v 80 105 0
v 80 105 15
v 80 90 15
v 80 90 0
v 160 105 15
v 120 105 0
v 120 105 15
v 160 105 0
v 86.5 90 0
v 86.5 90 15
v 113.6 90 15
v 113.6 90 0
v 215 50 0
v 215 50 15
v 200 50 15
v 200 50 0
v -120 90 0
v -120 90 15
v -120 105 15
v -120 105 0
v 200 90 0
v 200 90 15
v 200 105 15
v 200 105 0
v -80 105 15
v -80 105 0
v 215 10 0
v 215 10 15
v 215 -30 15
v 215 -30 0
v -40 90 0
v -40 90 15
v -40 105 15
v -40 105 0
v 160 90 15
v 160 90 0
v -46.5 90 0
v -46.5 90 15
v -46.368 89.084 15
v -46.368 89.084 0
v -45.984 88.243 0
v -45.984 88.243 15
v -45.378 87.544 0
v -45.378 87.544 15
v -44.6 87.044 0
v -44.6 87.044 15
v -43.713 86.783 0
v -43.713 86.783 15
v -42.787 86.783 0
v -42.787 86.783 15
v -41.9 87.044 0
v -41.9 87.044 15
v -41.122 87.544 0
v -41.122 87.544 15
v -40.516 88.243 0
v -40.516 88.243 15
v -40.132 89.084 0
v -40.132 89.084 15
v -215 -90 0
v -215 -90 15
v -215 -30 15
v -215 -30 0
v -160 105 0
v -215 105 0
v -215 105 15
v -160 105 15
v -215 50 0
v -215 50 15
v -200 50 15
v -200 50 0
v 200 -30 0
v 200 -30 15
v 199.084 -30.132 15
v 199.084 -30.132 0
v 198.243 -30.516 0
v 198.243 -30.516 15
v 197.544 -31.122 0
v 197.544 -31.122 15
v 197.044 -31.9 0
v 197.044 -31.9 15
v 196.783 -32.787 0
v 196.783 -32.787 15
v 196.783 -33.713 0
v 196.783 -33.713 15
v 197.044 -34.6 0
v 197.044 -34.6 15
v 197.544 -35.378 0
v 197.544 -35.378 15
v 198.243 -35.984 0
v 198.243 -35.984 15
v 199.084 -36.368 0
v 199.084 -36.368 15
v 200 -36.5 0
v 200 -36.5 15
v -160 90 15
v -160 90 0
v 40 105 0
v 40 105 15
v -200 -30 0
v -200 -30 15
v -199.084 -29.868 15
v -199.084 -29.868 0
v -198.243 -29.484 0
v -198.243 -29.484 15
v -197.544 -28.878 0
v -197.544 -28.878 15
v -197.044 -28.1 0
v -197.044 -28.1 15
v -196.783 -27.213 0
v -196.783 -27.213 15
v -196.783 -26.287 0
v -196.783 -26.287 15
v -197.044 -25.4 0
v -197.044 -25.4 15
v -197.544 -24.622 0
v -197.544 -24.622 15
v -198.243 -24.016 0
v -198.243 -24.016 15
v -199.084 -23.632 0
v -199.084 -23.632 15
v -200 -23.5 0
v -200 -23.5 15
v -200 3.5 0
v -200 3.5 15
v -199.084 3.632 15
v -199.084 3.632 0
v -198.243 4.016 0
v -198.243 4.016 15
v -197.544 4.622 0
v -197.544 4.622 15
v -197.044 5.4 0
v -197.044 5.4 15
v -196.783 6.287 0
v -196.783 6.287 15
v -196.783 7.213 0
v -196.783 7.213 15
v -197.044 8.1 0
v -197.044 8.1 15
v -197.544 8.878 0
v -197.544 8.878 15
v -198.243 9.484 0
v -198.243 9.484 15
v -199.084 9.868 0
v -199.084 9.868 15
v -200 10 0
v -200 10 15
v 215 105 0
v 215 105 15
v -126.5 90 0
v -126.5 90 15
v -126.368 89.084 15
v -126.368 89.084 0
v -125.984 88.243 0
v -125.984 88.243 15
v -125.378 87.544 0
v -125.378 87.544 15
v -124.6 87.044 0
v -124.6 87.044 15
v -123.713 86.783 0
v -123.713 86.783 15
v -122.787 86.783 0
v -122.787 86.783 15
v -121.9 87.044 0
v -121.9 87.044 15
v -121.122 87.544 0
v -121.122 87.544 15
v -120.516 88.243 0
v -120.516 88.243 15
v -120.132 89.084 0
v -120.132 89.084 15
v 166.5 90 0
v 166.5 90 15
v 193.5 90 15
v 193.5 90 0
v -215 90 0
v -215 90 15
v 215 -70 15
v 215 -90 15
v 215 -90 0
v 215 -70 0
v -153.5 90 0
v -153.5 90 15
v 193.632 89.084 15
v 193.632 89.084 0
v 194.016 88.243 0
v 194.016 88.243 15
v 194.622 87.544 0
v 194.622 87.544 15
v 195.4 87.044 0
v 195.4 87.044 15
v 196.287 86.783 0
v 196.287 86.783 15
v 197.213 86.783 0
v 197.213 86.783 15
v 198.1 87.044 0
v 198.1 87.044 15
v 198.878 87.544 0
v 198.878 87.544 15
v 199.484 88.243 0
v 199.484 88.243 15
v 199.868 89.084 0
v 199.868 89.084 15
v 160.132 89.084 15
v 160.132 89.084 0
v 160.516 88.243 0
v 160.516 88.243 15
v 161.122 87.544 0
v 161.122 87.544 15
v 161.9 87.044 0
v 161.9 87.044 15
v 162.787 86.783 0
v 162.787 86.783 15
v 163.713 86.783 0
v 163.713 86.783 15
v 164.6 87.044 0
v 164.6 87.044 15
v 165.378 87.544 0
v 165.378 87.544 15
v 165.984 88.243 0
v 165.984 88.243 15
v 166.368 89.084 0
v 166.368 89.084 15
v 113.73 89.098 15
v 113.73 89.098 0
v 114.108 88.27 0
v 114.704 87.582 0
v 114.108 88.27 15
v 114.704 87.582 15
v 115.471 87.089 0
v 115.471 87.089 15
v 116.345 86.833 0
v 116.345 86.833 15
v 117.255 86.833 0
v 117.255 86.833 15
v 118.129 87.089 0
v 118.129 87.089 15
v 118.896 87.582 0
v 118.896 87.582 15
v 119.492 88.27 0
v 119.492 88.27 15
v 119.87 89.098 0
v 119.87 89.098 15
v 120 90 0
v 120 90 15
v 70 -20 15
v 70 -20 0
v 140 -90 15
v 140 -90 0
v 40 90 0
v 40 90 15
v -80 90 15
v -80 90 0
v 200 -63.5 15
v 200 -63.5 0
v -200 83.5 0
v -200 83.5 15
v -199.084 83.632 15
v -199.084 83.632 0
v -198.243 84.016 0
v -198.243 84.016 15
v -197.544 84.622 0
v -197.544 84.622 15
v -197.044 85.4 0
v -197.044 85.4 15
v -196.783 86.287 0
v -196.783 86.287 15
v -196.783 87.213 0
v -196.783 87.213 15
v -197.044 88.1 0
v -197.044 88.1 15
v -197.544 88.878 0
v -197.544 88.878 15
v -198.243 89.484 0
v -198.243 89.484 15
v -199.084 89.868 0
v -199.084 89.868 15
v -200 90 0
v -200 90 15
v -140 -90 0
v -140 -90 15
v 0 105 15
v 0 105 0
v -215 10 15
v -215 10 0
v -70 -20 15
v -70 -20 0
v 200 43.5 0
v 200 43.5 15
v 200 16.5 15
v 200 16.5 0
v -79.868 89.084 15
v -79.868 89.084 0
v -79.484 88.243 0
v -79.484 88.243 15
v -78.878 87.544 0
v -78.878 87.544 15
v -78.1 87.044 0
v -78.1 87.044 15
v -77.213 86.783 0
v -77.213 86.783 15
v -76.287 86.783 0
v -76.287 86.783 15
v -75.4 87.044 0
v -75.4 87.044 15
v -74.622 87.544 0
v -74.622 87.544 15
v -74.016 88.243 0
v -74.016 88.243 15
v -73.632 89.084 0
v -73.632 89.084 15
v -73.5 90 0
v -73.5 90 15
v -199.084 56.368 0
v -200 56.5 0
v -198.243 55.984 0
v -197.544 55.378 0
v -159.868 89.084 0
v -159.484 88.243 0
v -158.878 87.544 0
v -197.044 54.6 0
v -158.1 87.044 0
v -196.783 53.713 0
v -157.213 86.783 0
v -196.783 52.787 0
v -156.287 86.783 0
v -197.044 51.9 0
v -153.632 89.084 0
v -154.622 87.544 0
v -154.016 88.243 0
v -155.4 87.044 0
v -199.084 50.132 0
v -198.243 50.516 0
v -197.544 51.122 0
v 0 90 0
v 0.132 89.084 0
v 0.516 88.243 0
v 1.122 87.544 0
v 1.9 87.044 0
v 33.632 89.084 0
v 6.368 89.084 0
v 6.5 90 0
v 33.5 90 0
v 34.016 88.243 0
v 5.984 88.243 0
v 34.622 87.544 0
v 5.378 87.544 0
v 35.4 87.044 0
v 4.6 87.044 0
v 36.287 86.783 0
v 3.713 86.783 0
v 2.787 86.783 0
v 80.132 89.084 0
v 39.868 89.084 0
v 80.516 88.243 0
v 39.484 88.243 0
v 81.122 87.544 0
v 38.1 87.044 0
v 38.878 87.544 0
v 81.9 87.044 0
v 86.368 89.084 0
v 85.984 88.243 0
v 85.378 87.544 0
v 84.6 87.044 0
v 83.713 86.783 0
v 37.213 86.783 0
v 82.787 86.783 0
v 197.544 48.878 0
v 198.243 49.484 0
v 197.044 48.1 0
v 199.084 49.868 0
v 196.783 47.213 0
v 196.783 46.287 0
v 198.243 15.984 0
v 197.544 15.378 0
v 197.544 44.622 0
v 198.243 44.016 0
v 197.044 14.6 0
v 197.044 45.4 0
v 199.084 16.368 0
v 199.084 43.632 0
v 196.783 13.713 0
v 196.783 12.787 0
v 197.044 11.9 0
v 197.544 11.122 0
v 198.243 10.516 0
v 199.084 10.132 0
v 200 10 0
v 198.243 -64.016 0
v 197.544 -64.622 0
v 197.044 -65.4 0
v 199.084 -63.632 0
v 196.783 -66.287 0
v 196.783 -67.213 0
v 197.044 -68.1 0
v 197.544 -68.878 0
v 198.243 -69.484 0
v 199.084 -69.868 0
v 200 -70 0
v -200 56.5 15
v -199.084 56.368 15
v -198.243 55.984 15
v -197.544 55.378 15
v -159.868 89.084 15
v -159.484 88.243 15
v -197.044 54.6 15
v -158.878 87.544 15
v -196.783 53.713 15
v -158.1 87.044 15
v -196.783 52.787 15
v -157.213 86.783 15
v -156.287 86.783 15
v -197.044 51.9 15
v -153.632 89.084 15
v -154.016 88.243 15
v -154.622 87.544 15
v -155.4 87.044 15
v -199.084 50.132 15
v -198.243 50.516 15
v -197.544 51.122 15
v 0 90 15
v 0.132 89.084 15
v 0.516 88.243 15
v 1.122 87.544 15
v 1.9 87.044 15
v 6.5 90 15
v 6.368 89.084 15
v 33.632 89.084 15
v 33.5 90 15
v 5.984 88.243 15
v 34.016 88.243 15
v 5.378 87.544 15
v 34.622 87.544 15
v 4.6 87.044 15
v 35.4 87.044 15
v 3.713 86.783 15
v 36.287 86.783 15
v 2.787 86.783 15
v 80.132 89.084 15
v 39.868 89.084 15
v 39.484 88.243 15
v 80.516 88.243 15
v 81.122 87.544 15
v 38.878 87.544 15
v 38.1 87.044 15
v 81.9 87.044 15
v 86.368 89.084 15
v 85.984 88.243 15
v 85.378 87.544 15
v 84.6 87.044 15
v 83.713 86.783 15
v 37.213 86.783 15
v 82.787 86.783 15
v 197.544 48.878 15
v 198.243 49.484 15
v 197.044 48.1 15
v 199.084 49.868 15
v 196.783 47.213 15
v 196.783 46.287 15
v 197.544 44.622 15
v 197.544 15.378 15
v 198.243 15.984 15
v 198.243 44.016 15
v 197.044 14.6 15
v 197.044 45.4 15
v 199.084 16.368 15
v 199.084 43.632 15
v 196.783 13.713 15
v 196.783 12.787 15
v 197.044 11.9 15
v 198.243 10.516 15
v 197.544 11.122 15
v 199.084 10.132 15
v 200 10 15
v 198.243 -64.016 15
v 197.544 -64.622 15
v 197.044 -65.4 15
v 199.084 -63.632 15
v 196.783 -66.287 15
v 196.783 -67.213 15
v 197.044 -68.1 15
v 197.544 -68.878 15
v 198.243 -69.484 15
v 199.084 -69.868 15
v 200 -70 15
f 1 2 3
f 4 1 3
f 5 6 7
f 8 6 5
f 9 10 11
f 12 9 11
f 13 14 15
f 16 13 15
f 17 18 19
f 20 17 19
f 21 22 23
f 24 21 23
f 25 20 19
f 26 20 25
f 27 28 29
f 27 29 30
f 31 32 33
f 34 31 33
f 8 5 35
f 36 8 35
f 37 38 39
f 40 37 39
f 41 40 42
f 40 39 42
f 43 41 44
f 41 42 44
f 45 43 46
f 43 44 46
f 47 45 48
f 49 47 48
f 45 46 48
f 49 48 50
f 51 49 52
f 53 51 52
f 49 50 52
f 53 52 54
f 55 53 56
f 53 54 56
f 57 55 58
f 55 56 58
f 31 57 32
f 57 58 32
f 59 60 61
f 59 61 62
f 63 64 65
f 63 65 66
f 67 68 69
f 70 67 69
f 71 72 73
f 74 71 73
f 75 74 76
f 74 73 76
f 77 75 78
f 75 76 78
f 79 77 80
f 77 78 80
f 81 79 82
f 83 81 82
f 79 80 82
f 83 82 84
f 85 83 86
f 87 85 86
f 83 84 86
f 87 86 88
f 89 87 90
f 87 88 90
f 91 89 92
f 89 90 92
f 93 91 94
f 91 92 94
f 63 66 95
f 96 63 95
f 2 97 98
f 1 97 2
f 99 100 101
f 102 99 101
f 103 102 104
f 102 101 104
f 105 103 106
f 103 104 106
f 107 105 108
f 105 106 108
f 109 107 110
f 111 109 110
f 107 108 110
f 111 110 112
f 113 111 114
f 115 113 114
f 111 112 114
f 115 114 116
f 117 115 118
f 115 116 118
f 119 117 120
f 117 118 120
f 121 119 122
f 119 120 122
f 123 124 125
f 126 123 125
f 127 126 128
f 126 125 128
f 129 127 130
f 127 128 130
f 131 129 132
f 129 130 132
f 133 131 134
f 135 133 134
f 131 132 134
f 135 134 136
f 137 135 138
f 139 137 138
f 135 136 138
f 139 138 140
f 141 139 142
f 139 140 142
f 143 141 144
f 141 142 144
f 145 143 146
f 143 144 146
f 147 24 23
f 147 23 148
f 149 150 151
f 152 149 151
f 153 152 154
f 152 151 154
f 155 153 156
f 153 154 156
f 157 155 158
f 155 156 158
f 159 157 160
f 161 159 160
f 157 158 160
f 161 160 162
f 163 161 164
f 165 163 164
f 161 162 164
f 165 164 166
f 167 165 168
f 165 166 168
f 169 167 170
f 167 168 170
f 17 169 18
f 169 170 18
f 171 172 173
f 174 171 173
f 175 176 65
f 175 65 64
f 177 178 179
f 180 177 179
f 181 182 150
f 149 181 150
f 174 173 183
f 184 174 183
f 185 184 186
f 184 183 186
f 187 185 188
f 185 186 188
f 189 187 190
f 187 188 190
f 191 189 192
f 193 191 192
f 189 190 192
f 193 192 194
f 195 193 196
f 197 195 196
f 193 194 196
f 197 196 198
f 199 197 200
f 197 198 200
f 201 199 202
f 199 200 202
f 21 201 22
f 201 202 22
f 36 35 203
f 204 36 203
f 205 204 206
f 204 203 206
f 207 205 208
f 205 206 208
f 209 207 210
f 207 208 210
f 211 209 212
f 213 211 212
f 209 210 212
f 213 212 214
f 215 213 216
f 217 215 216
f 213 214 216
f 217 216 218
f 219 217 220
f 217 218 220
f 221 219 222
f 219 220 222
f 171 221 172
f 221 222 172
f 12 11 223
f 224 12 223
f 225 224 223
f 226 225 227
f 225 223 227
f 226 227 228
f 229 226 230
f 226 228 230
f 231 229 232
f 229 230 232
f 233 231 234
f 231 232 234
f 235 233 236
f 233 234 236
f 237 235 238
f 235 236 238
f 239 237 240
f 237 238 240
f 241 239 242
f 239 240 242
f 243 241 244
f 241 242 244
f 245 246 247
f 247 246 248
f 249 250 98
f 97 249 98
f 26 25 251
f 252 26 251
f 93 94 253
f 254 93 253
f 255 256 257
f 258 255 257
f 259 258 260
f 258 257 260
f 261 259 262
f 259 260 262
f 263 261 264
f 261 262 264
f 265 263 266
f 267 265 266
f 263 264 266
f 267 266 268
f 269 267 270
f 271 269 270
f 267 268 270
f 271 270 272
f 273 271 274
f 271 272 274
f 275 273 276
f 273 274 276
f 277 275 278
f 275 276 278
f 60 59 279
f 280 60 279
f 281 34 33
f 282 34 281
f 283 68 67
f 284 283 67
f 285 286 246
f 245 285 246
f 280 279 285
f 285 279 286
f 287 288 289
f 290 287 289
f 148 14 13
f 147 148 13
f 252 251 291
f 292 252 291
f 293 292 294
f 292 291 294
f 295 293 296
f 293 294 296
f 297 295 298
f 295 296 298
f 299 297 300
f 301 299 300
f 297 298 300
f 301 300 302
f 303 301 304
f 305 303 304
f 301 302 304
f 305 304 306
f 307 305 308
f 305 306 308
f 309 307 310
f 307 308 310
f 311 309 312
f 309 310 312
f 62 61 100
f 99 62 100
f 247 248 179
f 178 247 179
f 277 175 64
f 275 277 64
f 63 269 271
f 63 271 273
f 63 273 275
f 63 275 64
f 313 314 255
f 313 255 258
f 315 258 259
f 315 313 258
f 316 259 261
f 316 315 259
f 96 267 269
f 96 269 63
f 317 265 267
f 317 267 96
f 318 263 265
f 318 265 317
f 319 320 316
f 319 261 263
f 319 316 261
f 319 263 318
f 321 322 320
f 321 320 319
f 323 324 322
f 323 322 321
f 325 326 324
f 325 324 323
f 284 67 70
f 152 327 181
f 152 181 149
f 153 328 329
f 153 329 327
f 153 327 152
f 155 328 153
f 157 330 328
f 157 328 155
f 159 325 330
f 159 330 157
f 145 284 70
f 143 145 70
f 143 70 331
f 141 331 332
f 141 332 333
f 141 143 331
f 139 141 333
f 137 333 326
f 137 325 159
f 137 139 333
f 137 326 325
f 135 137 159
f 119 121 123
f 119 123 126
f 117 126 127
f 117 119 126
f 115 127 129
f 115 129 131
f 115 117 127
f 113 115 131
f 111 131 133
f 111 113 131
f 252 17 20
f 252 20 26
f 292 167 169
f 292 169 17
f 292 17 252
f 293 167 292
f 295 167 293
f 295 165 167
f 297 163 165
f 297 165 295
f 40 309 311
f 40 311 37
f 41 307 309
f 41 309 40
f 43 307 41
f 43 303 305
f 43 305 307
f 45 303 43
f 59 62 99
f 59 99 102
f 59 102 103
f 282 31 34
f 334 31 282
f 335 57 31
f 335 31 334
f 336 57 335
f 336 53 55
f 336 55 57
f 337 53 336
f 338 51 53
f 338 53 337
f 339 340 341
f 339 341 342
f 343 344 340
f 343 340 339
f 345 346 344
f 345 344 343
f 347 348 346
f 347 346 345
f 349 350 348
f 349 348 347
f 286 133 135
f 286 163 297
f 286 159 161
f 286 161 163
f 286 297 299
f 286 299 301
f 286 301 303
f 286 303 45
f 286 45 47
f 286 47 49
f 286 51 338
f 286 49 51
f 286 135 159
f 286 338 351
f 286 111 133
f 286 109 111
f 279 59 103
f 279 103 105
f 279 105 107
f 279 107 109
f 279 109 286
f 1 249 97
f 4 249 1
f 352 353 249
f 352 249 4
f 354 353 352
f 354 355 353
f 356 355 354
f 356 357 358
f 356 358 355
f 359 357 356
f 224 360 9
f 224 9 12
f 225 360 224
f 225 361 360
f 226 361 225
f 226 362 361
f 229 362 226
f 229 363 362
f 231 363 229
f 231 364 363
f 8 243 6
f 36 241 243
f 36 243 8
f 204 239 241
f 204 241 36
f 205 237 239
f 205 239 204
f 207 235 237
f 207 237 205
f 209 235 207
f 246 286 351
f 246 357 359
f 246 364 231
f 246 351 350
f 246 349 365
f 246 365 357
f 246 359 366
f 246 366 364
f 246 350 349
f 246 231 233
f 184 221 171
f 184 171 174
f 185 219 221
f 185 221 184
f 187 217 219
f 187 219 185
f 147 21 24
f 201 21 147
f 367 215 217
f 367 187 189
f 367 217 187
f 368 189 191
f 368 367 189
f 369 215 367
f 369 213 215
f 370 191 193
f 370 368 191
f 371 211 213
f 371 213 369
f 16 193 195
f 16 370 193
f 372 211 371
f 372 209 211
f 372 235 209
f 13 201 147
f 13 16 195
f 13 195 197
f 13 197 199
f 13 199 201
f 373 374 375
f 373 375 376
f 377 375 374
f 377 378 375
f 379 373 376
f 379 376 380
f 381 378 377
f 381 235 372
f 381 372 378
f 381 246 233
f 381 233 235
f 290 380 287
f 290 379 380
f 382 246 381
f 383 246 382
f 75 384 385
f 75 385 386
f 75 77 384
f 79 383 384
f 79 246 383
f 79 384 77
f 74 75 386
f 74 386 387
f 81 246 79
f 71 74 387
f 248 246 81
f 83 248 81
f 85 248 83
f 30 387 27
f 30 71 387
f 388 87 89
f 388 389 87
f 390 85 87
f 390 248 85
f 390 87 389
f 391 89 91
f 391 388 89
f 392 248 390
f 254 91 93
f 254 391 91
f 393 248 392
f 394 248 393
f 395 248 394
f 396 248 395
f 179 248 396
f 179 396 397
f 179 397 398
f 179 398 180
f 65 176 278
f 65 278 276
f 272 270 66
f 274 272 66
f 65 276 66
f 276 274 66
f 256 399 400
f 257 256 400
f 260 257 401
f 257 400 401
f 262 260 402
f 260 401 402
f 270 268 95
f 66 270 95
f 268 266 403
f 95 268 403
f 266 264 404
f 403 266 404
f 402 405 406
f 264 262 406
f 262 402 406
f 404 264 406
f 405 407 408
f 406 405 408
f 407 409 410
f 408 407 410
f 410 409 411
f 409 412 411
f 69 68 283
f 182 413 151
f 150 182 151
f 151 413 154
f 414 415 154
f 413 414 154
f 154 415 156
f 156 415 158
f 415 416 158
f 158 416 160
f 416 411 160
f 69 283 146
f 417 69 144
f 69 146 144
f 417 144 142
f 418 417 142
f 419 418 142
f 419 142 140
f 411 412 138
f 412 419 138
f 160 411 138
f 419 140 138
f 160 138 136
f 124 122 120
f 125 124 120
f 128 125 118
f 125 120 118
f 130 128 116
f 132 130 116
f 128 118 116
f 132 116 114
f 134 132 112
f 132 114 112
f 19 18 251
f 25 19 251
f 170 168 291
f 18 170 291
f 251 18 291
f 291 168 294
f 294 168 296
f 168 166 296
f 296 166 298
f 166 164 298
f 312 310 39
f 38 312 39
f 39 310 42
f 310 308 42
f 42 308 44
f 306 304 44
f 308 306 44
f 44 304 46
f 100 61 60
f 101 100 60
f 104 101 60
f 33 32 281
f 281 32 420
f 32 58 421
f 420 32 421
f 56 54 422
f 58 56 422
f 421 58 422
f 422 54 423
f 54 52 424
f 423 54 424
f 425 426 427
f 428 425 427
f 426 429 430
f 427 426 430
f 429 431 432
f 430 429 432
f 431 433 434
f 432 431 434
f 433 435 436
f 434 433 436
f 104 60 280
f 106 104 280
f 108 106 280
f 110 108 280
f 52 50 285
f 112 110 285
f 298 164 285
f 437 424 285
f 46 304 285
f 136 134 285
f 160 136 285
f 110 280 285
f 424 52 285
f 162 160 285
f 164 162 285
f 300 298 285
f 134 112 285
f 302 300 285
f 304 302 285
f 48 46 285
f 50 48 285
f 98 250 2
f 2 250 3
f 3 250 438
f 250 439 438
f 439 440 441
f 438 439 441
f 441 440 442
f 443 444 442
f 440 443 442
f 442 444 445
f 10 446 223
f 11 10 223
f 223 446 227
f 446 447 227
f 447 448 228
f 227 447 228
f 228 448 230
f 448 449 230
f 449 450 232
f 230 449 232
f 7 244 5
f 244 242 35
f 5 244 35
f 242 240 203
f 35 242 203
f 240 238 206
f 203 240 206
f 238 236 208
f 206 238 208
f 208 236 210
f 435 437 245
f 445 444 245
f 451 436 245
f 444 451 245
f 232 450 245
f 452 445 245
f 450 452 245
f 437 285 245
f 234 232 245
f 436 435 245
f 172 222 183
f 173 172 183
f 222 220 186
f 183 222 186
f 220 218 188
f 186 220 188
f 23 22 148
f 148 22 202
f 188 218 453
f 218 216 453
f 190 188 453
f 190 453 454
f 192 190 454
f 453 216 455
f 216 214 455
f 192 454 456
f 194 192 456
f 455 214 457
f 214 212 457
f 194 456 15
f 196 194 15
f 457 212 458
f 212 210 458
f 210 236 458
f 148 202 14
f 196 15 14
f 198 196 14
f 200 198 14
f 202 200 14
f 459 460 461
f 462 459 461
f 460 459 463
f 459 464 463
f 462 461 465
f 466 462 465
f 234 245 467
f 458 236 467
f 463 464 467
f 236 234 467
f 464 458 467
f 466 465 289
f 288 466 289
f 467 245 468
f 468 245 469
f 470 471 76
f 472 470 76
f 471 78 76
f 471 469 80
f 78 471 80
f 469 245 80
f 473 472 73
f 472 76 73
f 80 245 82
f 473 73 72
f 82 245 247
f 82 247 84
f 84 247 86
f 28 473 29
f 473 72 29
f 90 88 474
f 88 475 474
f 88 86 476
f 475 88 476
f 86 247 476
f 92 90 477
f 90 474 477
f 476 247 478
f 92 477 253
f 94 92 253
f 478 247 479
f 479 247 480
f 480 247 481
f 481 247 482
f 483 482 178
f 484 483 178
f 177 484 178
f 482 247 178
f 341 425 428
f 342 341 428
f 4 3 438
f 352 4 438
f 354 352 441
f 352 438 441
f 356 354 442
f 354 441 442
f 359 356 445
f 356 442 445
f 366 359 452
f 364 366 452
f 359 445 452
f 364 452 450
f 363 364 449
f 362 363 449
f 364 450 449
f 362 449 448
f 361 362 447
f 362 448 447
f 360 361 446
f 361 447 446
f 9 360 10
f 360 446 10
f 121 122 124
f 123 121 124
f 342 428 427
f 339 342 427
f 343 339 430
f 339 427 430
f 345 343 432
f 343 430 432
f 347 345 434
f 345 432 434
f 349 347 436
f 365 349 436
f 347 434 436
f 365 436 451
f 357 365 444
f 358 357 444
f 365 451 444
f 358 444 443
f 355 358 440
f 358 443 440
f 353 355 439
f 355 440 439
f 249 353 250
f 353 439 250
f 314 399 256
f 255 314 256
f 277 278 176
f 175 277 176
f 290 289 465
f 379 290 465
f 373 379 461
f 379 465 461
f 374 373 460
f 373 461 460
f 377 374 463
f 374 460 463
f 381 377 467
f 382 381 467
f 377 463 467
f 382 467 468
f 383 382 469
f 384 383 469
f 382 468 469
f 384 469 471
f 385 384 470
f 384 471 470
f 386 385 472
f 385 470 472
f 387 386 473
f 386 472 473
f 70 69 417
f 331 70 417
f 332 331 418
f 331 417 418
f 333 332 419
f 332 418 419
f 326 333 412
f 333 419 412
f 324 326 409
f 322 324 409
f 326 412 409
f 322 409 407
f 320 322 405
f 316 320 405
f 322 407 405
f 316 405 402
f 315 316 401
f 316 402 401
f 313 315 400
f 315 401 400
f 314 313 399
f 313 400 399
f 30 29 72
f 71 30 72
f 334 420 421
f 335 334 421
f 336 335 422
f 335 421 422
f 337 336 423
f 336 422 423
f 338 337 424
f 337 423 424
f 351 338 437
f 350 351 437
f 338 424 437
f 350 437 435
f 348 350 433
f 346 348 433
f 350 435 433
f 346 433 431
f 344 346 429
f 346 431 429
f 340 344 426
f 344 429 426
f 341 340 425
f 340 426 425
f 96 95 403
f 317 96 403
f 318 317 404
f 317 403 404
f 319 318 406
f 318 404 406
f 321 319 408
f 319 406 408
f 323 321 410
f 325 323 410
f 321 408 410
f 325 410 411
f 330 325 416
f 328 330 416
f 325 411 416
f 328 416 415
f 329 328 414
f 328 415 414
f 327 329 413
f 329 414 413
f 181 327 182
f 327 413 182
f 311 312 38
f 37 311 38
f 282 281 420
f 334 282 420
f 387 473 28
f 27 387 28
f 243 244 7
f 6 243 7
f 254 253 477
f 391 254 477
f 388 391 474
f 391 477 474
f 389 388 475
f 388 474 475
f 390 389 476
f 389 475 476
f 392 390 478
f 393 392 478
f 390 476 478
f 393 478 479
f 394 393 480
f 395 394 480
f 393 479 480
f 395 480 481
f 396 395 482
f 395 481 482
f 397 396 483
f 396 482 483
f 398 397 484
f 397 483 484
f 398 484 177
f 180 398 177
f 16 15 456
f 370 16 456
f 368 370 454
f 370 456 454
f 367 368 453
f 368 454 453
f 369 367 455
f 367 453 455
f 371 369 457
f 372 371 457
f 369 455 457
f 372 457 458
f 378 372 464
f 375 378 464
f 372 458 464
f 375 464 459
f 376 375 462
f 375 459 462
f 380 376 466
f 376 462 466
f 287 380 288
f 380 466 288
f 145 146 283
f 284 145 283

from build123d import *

# Parameters (mm, degrees)
SALIENTE_EXTRUIR1_DEPTH = 15
CROQUIS2_W              = 430
CROQUIS2_H              = 15
SALIENTE_EXTRUIR2_DEPTH = 15
CROQUIS3_W              = 40
CROQUIS3_H              = 19.65418827
CORTAR_EXTRUIR2_DEPTH   = 15
CORTAR_EXTRUIR3_DEPTH   = 15
CORTAR_EXTRUIR4_DEPTH   = 15


with BuildPart() as part:
    # Croquis1 → Saliente-Extruir1 (new body)
    with BuildSketch(Plane.XY):
        Polygon((95, -45), (140, -90), (215, -90), (215, -20), (215, 90), (-215, 90), (-215, -20), (-215, -90), (-140, -90), (-95, -45), (-70, -20), (70, -20), align=None)
    extrude(amount=SALIENTE_EXTRUIR1_DEPTH)

    # Croquis2 → Saliente-Extruir2 (add)
    with BuildSketch(Plane(origin=(0, 90, 0), x_dir=(1, 0, 0), z_dir=(0, 1, 0))):
        with Locations((0, -7.5)):
            Rectangle(CROQUIS2_W, CROQUIS2_H)
    extrude(amount=SALIENTE_EXTRUIR2_DEPTH)

    # Croquis3 → Cortar-Extruir2 (cut)
    with BuildSketch(Plane.XY.offset(15)):
        with Locations((-140, 114.827094135)):
            Rectangle(CROQUIS3_W, CROQUIS3_H)
        with BuildLine():
            Line((-120, 90), (-120, 105))
            Line((-120, 105), (-160, 105))
            Line((-160, 105), (-160, 90))
            ThreePointArc((-160, 90), (-156.75, 86.75), (-153.5, 90))
            Line((-153.5, 90), (-126.5, 90))
            ThreePointArc((-126.5, 90), (-123.25, 86.75), (-120, 90))
        make_face()
        with BuildLine():
            Line((-40, 90), (-40, 105))
            Line((-40, 105), (-80, 105))
            Line((-80, 105), (-80, 90))
            ThreePointArc((-80, 90), (-76.75, 86.75), (-73.5, 90))
            Line((-73.5, 90), (-46.5, 90))
            ThreePointArc((-46.5, 90), (-43.25, 86.75), (-40, 90))
        make_face()
        with Locations((-60, 114.827094135)):
            Rectangle(CROQUIS3_W, CROQUIS3_H)
        with BuildLine():
            Line((40, 105), (0, 105))
            Line((0, 105), (0, 90))
            ThreePointArc((0, 90), (3.25, 86.75), (6.5, 90))
            Line((6.5, 90), (33.5, 90))
            ThreePointArc((33.5, 90), (36.75, 86.75), (40, 90))
            Line((40, 90), (40, 105))
        make_face()
        with Locations((20, 114.827094135)):
            Rectangle(CROQUIS3_W, CROQUIS3_H)
        with BuildLine():
            Line((200, 105), (160, 105))
            Line((160, 105), (160, 90))
            ThreePointArc((160, 90), (163.25, 86.75), (166.5, 90))
            Line((166.5, 90), (193.5, 90))
            ThreePointArc((193.5, 90), (196.75, 86.75), (200, 90))
            Line((200, 90), (200, 105))
        make_face()
        with Locations((180, 114.827094135)):
            Rectangle(CROQUIS3_W, CROQUIS3_H)
        with Locations((100, 114.827094135)):
            Rectangle(CROQUIS3_W, CROQUIS3_H)
        with BuildLine():
            Line((120, 105), (80, 105))
            Line((80, 105), (80, 90))
            ThreePointArc((80, 90), (83.25, 86.75), (86.5, 90))
            Line((86.5, 90), (113.6, 90))
            ThreePointArc((113.6, 90), (116.8, 86.8), (120, 90))
            Line((120, 90), (120, 105))
        make_face()
    extrude(amount=-CORTAR_EXTRUIR2_DEPTH, mode=Mode.SUBTRACT)

    # Croquis4 → Cortar-Extruir3 (cut)
    with BuildSketch(Plane.XY.offset(15)):
        with BuildLine():
            Line((-200, 10), (-215, 10))
            Line((-215, 10), (-215, -30))
            Line((-215, -30), (-200, -30))
            ThreePointArc((-200, -30), (-196.75, -26.75), (-200, -23.5))
            Line((-200, -23.5), (-200, 3.5))
            ThreePointArc((-200, 3.5), (-196.75, 6.75), (-200, 10))
        make_face()
        with BuildLine():
            Line((-215, 90), (-215, 50))
            Line((-215, 50), (-200, 50))
            ThreePointArc((-200, 50), (-196.75, 53.25), (-200, 56.5))
            Line((-200, 56.5), (-200, 83.5))
            ThreePointArc((-200, 83.5), (-196.75, 86.75), (-200, 90))
            Line((-200, 90), (-215, 90))
        make_face()
    extrude(amount=-CORTAR_EXTRUIR3_DEPTH, mode=Mode.SUBTRACT)

    # Croquis5 → Cortar-Extruir4 (cut)
    with BuildSketch(Plane.XY.offset(15)):
        with BuildLine():
            Line((215, 10), (215, 50))
            Line((215, 50), (200, 50))
            ThreePointArc((200, 50), (196.75, 46.75), (200, 43.5))
            Line((200, 43.5), (200, 16.5))
            ThreePointArc((200, 16.5), (196.75, 13.25), (200, 10))
            Line((200, 10), (215, 10))
        make_face()
        with BuildLine():
            Line((215, -70), (215, -30))
            Line((215, -30), (200, -30))
            ThreePointArc((200, -30), (196.75, -33.25), (200, -36.5))
            Line((200, -36.5), (200, -63.5))
            ThreePointArc((200, -63.5), (196.75, -66.75), (200, -70))
            Line((200, -70), (215, -70))
        make_face()
    extrude(amount=-CORTAR_EXTRUIR4_DEPTH, mode=Mode.SUBTRACT)


solid = part.part
